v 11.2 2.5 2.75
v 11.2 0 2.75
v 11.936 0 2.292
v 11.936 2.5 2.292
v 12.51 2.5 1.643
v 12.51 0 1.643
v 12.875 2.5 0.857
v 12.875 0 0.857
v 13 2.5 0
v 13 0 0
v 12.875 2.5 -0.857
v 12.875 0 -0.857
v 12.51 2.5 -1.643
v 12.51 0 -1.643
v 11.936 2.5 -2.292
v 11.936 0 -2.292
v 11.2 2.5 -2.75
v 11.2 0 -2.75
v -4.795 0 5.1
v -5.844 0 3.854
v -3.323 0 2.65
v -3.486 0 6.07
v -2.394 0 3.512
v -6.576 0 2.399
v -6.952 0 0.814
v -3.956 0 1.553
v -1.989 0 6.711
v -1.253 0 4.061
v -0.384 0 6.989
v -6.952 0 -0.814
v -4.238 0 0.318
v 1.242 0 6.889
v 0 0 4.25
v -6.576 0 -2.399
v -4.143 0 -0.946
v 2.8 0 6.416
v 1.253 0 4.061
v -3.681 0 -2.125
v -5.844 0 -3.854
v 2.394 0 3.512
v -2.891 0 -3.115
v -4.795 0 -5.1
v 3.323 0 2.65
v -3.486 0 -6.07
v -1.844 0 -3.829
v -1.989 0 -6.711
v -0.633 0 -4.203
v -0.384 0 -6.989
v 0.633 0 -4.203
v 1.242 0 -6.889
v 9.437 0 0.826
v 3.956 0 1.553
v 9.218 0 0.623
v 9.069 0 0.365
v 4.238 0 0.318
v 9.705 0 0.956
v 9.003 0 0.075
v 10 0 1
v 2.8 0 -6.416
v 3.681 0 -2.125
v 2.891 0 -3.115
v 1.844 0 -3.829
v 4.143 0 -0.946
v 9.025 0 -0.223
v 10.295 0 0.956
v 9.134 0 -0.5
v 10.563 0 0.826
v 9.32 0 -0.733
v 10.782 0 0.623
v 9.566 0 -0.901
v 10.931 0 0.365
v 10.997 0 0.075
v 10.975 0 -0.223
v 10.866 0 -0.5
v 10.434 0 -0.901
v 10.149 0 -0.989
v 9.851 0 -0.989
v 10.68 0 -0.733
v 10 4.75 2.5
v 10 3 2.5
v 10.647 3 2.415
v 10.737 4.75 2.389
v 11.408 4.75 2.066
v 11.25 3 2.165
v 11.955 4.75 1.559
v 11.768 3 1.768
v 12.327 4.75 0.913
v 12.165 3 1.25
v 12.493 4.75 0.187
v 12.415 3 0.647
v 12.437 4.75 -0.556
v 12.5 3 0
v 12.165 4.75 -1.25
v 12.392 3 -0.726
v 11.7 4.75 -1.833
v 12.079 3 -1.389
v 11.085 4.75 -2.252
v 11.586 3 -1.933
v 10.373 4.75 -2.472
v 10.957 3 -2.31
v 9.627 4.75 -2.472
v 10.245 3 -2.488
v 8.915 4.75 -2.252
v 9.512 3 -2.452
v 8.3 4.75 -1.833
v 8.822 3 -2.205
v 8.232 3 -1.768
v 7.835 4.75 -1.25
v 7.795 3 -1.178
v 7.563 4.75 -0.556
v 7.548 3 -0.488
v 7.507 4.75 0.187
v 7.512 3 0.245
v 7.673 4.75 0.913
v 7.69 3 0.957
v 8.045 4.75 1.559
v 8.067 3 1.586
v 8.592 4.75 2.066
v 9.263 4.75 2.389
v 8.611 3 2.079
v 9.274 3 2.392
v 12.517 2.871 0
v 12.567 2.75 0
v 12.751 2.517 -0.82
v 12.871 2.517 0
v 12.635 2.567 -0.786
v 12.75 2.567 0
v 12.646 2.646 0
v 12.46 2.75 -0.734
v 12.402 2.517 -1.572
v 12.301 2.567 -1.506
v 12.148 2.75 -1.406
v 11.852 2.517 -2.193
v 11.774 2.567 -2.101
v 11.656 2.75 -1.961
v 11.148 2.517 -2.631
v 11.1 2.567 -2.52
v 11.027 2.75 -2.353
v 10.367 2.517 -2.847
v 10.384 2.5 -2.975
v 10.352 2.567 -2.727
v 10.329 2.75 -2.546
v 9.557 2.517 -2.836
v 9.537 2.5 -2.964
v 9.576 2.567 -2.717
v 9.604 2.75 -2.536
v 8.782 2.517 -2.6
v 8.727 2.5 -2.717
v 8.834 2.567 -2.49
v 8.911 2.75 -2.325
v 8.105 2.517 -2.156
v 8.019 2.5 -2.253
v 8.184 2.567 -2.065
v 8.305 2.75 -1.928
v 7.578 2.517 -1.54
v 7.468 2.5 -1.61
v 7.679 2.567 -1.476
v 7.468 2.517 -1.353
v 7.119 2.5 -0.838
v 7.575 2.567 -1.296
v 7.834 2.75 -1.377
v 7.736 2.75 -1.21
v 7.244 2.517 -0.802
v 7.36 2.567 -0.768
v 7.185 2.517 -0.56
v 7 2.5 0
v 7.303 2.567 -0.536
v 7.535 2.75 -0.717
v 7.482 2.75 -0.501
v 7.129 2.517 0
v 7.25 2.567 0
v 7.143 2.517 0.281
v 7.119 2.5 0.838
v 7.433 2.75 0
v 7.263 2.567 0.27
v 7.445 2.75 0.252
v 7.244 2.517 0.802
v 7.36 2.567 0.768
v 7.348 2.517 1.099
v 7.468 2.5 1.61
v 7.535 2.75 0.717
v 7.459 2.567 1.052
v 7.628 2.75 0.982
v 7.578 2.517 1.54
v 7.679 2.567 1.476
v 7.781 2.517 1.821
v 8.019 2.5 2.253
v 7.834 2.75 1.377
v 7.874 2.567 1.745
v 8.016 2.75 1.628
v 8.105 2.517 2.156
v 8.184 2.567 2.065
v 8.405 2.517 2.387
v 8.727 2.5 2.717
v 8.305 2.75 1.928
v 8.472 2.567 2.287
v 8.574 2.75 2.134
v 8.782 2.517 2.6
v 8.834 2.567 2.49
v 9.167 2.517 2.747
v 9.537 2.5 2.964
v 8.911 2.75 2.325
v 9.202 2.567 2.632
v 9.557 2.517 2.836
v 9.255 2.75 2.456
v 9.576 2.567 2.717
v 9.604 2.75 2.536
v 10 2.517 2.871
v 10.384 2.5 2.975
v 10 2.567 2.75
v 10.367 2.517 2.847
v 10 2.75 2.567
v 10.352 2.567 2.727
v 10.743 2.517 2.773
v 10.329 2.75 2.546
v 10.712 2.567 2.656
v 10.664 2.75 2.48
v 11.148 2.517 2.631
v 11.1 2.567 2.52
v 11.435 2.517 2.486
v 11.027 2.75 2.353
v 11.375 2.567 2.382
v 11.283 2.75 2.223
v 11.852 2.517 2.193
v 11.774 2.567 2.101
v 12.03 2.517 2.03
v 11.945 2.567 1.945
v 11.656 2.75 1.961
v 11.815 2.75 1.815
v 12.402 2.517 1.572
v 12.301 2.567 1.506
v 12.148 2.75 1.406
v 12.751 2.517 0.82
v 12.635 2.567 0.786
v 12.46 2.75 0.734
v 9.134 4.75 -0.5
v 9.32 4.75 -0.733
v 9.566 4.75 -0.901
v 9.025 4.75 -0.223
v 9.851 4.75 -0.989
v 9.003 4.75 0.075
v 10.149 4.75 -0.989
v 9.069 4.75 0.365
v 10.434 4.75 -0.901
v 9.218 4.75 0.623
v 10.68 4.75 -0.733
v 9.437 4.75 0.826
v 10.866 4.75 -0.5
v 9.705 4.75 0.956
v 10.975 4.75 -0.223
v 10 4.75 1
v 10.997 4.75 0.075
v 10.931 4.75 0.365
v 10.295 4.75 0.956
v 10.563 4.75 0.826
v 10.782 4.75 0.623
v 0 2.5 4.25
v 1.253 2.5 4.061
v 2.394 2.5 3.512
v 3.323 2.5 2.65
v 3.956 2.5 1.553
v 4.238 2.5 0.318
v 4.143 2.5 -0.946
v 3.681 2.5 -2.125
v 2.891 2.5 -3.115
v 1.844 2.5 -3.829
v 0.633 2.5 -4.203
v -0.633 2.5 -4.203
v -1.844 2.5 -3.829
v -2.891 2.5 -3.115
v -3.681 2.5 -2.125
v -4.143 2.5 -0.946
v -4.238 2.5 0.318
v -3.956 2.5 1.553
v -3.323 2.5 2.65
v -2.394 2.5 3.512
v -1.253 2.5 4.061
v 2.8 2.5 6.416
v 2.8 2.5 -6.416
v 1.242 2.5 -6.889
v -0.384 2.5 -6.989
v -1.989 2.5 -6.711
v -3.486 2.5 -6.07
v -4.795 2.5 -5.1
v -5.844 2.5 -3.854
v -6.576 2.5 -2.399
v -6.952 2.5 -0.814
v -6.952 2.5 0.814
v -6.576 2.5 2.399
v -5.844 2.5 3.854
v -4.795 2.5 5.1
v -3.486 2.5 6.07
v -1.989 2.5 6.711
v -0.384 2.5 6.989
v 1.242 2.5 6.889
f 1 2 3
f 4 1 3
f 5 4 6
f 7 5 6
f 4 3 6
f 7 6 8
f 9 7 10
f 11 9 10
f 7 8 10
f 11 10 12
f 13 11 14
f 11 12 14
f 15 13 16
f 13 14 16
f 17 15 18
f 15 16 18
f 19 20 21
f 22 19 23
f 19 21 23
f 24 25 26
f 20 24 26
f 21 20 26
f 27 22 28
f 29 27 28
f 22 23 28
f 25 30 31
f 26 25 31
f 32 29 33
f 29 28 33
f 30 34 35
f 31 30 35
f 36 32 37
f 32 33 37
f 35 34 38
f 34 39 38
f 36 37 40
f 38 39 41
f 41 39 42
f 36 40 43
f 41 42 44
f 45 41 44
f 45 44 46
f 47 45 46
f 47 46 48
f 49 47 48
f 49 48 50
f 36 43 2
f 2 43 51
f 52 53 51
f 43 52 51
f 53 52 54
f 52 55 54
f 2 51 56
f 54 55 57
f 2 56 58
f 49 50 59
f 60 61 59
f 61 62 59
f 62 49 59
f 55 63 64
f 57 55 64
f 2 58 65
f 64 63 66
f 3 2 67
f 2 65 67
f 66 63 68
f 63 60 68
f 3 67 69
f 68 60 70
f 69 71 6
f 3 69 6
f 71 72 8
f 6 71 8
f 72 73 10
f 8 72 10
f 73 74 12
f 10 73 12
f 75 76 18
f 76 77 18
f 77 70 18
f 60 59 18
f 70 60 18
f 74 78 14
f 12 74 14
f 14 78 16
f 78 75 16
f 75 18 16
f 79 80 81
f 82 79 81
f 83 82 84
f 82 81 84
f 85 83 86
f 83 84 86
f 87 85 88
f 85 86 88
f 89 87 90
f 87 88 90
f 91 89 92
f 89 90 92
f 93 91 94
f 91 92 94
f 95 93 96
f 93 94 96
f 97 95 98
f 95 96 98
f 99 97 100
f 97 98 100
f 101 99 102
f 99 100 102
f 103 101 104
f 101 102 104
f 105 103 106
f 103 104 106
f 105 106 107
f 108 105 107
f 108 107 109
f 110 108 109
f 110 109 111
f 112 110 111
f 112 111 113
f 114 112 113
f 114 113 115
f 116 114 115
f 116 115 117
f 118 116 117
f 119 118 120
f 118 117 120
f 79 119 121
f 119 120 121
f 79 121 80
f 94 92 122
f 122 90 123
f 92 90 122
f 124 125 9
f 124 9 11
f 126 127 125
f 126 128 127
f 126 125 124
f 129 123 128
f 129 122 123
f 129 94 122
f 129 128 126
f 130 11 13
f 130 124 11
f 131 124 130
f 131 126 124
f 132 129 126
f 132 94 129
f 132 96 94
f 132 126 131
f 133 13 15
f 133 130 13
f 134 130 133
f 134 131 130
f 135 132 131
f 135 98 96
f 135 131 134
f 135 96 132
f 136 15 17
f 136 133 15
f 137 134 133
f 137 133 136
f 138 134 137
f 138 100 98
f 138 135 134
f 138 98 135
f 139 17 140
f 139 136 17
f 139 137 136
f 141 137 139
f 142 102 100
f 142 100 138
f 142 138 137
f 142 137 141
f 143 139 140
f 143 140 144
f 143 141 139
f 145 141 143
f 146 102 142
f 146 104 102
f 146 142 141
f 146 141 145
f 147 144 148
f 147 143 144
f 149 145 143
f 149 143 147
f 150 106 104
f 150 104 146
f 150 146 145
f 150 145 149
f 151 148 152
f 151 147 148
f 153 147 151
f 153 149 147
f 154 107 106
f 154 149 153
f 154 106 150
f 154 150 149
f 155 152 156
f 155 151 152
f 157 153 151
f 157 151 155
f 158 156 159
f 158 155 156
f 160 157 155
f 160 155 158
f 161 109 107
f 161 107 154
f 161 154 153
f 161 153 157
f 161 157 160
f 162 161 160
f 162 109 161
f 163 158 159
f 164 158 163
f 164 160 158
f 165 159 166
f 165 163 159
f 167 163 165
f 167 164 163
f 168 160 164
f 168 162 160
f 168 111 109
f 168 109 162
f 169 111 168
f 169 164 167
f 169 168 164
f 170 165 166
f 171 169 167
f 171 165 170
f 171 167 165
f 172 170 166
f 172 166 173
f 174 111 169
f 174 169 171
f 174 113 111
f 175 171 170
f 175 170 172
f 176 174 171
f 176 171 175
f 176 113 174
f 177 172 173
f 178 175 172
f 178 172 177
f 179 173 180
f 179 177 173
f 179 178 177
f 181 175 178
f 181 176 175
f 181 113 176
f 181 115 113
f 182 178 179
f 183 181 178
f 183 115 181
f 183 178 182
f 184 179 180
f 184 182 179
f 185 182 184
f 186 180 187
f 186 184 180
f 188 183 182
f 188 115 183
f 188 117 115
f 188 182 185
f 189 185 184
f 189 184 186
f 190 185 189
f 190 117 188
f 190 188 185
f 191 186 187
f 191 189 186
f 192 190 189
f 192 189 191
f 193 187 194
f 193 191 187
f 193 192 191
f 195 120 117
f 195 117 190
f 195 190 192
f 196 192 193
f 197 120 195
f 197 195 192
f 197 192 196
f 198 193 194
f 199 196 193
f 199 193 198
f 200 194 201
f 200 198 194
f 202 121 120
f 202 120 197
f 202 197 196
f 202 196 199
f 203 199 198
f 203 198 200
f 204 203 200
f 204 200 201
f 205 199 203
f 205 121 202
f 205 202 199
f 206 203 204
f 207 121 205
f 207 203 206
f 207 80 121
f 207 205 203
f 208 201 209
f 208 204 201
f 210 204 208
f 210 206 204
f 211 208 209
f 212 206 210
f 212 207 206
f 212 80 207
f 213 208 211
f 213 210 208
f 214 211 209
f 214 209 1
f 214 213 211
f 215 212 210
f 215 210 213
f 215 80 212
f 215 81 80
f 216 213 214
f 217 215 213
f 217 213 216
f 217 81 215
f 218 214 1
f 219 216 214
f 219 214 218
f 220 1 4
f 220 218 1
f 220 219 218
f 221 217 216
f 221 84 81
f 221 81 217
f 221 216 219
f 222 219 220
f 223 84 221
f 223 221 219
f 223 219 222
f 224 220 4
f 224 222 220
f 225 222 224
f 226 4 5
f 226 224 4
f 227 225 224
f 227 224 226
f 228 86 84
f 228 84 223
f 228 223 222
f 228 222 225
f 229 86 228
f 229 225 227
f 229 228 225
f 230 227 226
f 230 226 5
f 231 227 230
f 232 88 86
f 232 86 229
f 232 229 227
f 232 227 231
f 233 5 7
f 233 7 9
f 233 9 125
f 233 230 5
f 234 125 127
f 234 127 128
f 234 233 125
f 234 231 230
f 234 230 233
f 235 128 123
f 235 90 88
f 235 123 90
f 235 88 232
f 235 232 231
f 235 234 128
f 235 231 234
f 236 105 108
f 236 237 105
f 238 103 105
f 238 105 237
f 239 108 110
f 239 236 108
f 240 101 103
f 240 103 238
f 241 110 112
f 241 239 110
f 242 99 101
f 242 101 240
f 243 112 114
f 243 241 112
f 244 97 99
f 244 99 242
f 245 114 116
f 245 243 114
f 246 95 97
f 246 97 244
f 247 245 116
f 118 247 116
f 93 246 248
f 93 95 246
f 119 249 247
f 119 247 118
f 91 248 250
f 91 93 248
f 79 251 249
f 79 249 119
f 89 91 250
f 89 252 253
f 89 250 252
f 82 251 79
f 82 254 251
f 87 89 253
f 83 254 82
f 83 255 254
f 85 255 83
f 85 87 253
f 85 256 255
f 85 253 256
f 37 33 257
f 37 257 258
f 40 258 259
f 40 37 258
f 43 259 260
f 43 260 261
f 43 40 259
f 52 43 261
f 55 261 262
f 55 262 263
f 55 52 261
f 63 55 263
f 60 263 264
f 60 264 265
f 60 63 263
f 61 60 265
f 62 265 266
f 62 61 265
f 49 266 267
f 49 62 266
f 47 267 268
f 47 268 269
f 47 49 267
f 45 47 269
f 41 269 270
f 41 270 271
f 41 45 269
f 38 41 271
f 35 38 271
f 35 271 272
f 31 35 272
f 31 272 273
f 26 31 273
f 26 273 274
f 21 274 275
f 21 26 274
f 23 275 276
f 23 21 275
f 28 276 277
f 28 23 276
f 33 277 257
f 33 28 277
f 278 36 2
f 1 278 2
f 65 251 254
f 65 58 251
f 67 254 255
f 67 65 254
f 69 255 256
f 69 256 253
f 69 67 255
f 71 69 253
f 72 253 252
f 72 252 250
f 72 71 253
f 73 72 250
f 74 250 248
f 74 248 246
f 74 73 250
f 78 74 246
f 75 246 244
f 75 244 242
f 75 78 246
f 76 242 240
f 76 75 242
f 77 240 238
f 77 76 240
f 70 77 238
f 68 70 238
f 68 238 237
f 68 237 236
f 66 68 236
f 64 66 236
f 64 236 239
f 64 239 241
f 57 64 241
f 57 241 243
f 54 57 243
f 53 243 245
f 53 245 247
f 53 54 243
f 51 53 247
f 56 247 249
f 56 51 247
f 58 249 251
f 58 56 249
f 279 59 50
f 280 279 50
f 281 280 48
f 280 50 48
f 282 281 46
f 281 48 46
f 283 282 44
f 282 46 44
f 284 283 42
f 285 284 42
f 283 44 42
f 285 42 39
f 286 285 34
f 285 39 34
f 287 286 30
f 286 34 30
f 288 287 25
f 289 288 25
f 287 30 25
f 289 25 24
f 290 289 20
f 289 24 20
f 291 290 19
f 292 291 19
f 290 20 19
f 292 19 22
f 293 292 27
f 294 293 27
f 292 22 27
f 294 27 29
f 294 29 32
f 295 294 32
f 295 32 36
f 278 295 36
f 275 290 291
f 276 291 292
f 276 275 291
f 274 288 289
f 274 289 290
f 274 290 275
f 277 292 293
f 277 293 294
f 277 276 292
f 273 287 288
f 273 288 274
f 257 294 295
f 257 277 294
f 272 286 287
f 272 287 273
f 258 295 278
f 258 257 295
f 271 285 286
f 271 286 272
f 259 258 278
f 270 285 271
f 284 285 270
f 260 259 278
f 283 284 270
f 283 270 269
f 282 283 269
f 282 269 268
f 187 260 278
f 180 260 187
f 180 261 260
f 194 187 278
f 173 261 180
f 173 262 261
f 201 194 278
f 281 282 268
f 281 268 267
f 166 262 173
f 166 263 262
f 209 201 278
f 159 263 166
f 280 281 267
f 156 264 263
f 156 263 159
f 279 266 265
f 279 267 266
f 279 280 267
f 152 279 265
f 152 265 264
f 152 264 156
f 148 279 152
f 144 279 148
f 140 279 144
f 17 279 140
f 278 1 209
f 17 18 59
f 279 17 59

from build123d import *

# Parameters (mm, degrees)
SKETCH_1_R      = 7
SKETCH_1_R_2    = 4.2499999999999964
SKETCH_1_R_3    = 0.9999999999999998
EXTRUDE_1_DEPTH = 2.5
SKETCH_2_R      = 2.5000000000000004
SKETCH_2_R_2    = 0.9999999999999998
EXTRUDE_2_DEPTH = 2.25


with BuildPart() as part:
    # 草图1 → 凸台-拉伸1 (new body)
    # profile 1 of 2: a face of its own
    with BuildSketch(Plane(origin=(0, 0, 0), x_dir=(1, 0, 0), z_dir=(0, 1, 0))):
        Circle(SKETCH_1_R)
        with Locations(Location((0, 0, 0), (0, 0, 270))):
            Circle(SKETCH_1_R_2, mode=Mode.SUBTRACT)
    # profile 2 of 2: a face of its own
    with BuildSketch(Plane(origin=(0, 0, 0), x_dir=(1, 0, 0), z_dir=(0, 1, 0))):
        with BuildLine():
            Line((11.2, 2.749545416973503), (2.8000000000000003, 6.415605972938175))
            ThreePointArc((2.8000000000000007, 6.415605972938176), (5.856620185738529, 3.8340579025361627), (7, 0))
            ThreePointArc((7, -1.71e-15), (5.856620185738526, -3.834057902536167), (2.799999999999998, -6.4156059729381765))
            Line((2.8000000000000007, -6.415605972938176), (11.2, -2.749545416973503))
            ThreePointArc((11.2, -2.749545416973503), (13, 0), (11.2, 2.7495454169735036))
        make_face()
        with Locations(Location((10, 0, 0), (0, 0, 270))):
            Circle(SKETCH_1_R_3, mode=Mode.SUBTRACT)
    extrude(amount=EXTRUDE_1_DEPTH)

    # 草图2 → 凸台-拉伸2 (add)
    with BuildSketch(Plane(origin=(0, 2.5, 0), x_dir=(1, 0, 0), z_dir=(0, 1, 0))):
        with Locations(Location((10, 0, 0), (0, 0, 270))):
            Circle(SKETCH_2_R)
        with Locations(Location((10, 0, 0), (0, 0, 270))):
            Circle(SKETCH_2_R_2, mode=Mode.SUBTRACT)
    extrude(amount=EXTRUDE_2_DEPTH)

    # 圆角2: read off the stored shape, not the designer's step
    # 圆角2 outline → 圆角2 (revolve)
    with BuildSketch(Plane(origin=(10, 0, 0), x_dir=(1, 0, 0), z_dir=(0, 0, 1))):
        with BuildLine():
            ThreePointArc((3, 2.5), (2.646446609, 2.646446609), (2.5, 3))
            Line((2.5, 3), (2.5, 2.5))
            Line((2.5, 2.5), (3, 2.5))
        make_face()
    revolve(axis=Axis((10, 0, 0), (0, 1, 0)))


solid = part.part
